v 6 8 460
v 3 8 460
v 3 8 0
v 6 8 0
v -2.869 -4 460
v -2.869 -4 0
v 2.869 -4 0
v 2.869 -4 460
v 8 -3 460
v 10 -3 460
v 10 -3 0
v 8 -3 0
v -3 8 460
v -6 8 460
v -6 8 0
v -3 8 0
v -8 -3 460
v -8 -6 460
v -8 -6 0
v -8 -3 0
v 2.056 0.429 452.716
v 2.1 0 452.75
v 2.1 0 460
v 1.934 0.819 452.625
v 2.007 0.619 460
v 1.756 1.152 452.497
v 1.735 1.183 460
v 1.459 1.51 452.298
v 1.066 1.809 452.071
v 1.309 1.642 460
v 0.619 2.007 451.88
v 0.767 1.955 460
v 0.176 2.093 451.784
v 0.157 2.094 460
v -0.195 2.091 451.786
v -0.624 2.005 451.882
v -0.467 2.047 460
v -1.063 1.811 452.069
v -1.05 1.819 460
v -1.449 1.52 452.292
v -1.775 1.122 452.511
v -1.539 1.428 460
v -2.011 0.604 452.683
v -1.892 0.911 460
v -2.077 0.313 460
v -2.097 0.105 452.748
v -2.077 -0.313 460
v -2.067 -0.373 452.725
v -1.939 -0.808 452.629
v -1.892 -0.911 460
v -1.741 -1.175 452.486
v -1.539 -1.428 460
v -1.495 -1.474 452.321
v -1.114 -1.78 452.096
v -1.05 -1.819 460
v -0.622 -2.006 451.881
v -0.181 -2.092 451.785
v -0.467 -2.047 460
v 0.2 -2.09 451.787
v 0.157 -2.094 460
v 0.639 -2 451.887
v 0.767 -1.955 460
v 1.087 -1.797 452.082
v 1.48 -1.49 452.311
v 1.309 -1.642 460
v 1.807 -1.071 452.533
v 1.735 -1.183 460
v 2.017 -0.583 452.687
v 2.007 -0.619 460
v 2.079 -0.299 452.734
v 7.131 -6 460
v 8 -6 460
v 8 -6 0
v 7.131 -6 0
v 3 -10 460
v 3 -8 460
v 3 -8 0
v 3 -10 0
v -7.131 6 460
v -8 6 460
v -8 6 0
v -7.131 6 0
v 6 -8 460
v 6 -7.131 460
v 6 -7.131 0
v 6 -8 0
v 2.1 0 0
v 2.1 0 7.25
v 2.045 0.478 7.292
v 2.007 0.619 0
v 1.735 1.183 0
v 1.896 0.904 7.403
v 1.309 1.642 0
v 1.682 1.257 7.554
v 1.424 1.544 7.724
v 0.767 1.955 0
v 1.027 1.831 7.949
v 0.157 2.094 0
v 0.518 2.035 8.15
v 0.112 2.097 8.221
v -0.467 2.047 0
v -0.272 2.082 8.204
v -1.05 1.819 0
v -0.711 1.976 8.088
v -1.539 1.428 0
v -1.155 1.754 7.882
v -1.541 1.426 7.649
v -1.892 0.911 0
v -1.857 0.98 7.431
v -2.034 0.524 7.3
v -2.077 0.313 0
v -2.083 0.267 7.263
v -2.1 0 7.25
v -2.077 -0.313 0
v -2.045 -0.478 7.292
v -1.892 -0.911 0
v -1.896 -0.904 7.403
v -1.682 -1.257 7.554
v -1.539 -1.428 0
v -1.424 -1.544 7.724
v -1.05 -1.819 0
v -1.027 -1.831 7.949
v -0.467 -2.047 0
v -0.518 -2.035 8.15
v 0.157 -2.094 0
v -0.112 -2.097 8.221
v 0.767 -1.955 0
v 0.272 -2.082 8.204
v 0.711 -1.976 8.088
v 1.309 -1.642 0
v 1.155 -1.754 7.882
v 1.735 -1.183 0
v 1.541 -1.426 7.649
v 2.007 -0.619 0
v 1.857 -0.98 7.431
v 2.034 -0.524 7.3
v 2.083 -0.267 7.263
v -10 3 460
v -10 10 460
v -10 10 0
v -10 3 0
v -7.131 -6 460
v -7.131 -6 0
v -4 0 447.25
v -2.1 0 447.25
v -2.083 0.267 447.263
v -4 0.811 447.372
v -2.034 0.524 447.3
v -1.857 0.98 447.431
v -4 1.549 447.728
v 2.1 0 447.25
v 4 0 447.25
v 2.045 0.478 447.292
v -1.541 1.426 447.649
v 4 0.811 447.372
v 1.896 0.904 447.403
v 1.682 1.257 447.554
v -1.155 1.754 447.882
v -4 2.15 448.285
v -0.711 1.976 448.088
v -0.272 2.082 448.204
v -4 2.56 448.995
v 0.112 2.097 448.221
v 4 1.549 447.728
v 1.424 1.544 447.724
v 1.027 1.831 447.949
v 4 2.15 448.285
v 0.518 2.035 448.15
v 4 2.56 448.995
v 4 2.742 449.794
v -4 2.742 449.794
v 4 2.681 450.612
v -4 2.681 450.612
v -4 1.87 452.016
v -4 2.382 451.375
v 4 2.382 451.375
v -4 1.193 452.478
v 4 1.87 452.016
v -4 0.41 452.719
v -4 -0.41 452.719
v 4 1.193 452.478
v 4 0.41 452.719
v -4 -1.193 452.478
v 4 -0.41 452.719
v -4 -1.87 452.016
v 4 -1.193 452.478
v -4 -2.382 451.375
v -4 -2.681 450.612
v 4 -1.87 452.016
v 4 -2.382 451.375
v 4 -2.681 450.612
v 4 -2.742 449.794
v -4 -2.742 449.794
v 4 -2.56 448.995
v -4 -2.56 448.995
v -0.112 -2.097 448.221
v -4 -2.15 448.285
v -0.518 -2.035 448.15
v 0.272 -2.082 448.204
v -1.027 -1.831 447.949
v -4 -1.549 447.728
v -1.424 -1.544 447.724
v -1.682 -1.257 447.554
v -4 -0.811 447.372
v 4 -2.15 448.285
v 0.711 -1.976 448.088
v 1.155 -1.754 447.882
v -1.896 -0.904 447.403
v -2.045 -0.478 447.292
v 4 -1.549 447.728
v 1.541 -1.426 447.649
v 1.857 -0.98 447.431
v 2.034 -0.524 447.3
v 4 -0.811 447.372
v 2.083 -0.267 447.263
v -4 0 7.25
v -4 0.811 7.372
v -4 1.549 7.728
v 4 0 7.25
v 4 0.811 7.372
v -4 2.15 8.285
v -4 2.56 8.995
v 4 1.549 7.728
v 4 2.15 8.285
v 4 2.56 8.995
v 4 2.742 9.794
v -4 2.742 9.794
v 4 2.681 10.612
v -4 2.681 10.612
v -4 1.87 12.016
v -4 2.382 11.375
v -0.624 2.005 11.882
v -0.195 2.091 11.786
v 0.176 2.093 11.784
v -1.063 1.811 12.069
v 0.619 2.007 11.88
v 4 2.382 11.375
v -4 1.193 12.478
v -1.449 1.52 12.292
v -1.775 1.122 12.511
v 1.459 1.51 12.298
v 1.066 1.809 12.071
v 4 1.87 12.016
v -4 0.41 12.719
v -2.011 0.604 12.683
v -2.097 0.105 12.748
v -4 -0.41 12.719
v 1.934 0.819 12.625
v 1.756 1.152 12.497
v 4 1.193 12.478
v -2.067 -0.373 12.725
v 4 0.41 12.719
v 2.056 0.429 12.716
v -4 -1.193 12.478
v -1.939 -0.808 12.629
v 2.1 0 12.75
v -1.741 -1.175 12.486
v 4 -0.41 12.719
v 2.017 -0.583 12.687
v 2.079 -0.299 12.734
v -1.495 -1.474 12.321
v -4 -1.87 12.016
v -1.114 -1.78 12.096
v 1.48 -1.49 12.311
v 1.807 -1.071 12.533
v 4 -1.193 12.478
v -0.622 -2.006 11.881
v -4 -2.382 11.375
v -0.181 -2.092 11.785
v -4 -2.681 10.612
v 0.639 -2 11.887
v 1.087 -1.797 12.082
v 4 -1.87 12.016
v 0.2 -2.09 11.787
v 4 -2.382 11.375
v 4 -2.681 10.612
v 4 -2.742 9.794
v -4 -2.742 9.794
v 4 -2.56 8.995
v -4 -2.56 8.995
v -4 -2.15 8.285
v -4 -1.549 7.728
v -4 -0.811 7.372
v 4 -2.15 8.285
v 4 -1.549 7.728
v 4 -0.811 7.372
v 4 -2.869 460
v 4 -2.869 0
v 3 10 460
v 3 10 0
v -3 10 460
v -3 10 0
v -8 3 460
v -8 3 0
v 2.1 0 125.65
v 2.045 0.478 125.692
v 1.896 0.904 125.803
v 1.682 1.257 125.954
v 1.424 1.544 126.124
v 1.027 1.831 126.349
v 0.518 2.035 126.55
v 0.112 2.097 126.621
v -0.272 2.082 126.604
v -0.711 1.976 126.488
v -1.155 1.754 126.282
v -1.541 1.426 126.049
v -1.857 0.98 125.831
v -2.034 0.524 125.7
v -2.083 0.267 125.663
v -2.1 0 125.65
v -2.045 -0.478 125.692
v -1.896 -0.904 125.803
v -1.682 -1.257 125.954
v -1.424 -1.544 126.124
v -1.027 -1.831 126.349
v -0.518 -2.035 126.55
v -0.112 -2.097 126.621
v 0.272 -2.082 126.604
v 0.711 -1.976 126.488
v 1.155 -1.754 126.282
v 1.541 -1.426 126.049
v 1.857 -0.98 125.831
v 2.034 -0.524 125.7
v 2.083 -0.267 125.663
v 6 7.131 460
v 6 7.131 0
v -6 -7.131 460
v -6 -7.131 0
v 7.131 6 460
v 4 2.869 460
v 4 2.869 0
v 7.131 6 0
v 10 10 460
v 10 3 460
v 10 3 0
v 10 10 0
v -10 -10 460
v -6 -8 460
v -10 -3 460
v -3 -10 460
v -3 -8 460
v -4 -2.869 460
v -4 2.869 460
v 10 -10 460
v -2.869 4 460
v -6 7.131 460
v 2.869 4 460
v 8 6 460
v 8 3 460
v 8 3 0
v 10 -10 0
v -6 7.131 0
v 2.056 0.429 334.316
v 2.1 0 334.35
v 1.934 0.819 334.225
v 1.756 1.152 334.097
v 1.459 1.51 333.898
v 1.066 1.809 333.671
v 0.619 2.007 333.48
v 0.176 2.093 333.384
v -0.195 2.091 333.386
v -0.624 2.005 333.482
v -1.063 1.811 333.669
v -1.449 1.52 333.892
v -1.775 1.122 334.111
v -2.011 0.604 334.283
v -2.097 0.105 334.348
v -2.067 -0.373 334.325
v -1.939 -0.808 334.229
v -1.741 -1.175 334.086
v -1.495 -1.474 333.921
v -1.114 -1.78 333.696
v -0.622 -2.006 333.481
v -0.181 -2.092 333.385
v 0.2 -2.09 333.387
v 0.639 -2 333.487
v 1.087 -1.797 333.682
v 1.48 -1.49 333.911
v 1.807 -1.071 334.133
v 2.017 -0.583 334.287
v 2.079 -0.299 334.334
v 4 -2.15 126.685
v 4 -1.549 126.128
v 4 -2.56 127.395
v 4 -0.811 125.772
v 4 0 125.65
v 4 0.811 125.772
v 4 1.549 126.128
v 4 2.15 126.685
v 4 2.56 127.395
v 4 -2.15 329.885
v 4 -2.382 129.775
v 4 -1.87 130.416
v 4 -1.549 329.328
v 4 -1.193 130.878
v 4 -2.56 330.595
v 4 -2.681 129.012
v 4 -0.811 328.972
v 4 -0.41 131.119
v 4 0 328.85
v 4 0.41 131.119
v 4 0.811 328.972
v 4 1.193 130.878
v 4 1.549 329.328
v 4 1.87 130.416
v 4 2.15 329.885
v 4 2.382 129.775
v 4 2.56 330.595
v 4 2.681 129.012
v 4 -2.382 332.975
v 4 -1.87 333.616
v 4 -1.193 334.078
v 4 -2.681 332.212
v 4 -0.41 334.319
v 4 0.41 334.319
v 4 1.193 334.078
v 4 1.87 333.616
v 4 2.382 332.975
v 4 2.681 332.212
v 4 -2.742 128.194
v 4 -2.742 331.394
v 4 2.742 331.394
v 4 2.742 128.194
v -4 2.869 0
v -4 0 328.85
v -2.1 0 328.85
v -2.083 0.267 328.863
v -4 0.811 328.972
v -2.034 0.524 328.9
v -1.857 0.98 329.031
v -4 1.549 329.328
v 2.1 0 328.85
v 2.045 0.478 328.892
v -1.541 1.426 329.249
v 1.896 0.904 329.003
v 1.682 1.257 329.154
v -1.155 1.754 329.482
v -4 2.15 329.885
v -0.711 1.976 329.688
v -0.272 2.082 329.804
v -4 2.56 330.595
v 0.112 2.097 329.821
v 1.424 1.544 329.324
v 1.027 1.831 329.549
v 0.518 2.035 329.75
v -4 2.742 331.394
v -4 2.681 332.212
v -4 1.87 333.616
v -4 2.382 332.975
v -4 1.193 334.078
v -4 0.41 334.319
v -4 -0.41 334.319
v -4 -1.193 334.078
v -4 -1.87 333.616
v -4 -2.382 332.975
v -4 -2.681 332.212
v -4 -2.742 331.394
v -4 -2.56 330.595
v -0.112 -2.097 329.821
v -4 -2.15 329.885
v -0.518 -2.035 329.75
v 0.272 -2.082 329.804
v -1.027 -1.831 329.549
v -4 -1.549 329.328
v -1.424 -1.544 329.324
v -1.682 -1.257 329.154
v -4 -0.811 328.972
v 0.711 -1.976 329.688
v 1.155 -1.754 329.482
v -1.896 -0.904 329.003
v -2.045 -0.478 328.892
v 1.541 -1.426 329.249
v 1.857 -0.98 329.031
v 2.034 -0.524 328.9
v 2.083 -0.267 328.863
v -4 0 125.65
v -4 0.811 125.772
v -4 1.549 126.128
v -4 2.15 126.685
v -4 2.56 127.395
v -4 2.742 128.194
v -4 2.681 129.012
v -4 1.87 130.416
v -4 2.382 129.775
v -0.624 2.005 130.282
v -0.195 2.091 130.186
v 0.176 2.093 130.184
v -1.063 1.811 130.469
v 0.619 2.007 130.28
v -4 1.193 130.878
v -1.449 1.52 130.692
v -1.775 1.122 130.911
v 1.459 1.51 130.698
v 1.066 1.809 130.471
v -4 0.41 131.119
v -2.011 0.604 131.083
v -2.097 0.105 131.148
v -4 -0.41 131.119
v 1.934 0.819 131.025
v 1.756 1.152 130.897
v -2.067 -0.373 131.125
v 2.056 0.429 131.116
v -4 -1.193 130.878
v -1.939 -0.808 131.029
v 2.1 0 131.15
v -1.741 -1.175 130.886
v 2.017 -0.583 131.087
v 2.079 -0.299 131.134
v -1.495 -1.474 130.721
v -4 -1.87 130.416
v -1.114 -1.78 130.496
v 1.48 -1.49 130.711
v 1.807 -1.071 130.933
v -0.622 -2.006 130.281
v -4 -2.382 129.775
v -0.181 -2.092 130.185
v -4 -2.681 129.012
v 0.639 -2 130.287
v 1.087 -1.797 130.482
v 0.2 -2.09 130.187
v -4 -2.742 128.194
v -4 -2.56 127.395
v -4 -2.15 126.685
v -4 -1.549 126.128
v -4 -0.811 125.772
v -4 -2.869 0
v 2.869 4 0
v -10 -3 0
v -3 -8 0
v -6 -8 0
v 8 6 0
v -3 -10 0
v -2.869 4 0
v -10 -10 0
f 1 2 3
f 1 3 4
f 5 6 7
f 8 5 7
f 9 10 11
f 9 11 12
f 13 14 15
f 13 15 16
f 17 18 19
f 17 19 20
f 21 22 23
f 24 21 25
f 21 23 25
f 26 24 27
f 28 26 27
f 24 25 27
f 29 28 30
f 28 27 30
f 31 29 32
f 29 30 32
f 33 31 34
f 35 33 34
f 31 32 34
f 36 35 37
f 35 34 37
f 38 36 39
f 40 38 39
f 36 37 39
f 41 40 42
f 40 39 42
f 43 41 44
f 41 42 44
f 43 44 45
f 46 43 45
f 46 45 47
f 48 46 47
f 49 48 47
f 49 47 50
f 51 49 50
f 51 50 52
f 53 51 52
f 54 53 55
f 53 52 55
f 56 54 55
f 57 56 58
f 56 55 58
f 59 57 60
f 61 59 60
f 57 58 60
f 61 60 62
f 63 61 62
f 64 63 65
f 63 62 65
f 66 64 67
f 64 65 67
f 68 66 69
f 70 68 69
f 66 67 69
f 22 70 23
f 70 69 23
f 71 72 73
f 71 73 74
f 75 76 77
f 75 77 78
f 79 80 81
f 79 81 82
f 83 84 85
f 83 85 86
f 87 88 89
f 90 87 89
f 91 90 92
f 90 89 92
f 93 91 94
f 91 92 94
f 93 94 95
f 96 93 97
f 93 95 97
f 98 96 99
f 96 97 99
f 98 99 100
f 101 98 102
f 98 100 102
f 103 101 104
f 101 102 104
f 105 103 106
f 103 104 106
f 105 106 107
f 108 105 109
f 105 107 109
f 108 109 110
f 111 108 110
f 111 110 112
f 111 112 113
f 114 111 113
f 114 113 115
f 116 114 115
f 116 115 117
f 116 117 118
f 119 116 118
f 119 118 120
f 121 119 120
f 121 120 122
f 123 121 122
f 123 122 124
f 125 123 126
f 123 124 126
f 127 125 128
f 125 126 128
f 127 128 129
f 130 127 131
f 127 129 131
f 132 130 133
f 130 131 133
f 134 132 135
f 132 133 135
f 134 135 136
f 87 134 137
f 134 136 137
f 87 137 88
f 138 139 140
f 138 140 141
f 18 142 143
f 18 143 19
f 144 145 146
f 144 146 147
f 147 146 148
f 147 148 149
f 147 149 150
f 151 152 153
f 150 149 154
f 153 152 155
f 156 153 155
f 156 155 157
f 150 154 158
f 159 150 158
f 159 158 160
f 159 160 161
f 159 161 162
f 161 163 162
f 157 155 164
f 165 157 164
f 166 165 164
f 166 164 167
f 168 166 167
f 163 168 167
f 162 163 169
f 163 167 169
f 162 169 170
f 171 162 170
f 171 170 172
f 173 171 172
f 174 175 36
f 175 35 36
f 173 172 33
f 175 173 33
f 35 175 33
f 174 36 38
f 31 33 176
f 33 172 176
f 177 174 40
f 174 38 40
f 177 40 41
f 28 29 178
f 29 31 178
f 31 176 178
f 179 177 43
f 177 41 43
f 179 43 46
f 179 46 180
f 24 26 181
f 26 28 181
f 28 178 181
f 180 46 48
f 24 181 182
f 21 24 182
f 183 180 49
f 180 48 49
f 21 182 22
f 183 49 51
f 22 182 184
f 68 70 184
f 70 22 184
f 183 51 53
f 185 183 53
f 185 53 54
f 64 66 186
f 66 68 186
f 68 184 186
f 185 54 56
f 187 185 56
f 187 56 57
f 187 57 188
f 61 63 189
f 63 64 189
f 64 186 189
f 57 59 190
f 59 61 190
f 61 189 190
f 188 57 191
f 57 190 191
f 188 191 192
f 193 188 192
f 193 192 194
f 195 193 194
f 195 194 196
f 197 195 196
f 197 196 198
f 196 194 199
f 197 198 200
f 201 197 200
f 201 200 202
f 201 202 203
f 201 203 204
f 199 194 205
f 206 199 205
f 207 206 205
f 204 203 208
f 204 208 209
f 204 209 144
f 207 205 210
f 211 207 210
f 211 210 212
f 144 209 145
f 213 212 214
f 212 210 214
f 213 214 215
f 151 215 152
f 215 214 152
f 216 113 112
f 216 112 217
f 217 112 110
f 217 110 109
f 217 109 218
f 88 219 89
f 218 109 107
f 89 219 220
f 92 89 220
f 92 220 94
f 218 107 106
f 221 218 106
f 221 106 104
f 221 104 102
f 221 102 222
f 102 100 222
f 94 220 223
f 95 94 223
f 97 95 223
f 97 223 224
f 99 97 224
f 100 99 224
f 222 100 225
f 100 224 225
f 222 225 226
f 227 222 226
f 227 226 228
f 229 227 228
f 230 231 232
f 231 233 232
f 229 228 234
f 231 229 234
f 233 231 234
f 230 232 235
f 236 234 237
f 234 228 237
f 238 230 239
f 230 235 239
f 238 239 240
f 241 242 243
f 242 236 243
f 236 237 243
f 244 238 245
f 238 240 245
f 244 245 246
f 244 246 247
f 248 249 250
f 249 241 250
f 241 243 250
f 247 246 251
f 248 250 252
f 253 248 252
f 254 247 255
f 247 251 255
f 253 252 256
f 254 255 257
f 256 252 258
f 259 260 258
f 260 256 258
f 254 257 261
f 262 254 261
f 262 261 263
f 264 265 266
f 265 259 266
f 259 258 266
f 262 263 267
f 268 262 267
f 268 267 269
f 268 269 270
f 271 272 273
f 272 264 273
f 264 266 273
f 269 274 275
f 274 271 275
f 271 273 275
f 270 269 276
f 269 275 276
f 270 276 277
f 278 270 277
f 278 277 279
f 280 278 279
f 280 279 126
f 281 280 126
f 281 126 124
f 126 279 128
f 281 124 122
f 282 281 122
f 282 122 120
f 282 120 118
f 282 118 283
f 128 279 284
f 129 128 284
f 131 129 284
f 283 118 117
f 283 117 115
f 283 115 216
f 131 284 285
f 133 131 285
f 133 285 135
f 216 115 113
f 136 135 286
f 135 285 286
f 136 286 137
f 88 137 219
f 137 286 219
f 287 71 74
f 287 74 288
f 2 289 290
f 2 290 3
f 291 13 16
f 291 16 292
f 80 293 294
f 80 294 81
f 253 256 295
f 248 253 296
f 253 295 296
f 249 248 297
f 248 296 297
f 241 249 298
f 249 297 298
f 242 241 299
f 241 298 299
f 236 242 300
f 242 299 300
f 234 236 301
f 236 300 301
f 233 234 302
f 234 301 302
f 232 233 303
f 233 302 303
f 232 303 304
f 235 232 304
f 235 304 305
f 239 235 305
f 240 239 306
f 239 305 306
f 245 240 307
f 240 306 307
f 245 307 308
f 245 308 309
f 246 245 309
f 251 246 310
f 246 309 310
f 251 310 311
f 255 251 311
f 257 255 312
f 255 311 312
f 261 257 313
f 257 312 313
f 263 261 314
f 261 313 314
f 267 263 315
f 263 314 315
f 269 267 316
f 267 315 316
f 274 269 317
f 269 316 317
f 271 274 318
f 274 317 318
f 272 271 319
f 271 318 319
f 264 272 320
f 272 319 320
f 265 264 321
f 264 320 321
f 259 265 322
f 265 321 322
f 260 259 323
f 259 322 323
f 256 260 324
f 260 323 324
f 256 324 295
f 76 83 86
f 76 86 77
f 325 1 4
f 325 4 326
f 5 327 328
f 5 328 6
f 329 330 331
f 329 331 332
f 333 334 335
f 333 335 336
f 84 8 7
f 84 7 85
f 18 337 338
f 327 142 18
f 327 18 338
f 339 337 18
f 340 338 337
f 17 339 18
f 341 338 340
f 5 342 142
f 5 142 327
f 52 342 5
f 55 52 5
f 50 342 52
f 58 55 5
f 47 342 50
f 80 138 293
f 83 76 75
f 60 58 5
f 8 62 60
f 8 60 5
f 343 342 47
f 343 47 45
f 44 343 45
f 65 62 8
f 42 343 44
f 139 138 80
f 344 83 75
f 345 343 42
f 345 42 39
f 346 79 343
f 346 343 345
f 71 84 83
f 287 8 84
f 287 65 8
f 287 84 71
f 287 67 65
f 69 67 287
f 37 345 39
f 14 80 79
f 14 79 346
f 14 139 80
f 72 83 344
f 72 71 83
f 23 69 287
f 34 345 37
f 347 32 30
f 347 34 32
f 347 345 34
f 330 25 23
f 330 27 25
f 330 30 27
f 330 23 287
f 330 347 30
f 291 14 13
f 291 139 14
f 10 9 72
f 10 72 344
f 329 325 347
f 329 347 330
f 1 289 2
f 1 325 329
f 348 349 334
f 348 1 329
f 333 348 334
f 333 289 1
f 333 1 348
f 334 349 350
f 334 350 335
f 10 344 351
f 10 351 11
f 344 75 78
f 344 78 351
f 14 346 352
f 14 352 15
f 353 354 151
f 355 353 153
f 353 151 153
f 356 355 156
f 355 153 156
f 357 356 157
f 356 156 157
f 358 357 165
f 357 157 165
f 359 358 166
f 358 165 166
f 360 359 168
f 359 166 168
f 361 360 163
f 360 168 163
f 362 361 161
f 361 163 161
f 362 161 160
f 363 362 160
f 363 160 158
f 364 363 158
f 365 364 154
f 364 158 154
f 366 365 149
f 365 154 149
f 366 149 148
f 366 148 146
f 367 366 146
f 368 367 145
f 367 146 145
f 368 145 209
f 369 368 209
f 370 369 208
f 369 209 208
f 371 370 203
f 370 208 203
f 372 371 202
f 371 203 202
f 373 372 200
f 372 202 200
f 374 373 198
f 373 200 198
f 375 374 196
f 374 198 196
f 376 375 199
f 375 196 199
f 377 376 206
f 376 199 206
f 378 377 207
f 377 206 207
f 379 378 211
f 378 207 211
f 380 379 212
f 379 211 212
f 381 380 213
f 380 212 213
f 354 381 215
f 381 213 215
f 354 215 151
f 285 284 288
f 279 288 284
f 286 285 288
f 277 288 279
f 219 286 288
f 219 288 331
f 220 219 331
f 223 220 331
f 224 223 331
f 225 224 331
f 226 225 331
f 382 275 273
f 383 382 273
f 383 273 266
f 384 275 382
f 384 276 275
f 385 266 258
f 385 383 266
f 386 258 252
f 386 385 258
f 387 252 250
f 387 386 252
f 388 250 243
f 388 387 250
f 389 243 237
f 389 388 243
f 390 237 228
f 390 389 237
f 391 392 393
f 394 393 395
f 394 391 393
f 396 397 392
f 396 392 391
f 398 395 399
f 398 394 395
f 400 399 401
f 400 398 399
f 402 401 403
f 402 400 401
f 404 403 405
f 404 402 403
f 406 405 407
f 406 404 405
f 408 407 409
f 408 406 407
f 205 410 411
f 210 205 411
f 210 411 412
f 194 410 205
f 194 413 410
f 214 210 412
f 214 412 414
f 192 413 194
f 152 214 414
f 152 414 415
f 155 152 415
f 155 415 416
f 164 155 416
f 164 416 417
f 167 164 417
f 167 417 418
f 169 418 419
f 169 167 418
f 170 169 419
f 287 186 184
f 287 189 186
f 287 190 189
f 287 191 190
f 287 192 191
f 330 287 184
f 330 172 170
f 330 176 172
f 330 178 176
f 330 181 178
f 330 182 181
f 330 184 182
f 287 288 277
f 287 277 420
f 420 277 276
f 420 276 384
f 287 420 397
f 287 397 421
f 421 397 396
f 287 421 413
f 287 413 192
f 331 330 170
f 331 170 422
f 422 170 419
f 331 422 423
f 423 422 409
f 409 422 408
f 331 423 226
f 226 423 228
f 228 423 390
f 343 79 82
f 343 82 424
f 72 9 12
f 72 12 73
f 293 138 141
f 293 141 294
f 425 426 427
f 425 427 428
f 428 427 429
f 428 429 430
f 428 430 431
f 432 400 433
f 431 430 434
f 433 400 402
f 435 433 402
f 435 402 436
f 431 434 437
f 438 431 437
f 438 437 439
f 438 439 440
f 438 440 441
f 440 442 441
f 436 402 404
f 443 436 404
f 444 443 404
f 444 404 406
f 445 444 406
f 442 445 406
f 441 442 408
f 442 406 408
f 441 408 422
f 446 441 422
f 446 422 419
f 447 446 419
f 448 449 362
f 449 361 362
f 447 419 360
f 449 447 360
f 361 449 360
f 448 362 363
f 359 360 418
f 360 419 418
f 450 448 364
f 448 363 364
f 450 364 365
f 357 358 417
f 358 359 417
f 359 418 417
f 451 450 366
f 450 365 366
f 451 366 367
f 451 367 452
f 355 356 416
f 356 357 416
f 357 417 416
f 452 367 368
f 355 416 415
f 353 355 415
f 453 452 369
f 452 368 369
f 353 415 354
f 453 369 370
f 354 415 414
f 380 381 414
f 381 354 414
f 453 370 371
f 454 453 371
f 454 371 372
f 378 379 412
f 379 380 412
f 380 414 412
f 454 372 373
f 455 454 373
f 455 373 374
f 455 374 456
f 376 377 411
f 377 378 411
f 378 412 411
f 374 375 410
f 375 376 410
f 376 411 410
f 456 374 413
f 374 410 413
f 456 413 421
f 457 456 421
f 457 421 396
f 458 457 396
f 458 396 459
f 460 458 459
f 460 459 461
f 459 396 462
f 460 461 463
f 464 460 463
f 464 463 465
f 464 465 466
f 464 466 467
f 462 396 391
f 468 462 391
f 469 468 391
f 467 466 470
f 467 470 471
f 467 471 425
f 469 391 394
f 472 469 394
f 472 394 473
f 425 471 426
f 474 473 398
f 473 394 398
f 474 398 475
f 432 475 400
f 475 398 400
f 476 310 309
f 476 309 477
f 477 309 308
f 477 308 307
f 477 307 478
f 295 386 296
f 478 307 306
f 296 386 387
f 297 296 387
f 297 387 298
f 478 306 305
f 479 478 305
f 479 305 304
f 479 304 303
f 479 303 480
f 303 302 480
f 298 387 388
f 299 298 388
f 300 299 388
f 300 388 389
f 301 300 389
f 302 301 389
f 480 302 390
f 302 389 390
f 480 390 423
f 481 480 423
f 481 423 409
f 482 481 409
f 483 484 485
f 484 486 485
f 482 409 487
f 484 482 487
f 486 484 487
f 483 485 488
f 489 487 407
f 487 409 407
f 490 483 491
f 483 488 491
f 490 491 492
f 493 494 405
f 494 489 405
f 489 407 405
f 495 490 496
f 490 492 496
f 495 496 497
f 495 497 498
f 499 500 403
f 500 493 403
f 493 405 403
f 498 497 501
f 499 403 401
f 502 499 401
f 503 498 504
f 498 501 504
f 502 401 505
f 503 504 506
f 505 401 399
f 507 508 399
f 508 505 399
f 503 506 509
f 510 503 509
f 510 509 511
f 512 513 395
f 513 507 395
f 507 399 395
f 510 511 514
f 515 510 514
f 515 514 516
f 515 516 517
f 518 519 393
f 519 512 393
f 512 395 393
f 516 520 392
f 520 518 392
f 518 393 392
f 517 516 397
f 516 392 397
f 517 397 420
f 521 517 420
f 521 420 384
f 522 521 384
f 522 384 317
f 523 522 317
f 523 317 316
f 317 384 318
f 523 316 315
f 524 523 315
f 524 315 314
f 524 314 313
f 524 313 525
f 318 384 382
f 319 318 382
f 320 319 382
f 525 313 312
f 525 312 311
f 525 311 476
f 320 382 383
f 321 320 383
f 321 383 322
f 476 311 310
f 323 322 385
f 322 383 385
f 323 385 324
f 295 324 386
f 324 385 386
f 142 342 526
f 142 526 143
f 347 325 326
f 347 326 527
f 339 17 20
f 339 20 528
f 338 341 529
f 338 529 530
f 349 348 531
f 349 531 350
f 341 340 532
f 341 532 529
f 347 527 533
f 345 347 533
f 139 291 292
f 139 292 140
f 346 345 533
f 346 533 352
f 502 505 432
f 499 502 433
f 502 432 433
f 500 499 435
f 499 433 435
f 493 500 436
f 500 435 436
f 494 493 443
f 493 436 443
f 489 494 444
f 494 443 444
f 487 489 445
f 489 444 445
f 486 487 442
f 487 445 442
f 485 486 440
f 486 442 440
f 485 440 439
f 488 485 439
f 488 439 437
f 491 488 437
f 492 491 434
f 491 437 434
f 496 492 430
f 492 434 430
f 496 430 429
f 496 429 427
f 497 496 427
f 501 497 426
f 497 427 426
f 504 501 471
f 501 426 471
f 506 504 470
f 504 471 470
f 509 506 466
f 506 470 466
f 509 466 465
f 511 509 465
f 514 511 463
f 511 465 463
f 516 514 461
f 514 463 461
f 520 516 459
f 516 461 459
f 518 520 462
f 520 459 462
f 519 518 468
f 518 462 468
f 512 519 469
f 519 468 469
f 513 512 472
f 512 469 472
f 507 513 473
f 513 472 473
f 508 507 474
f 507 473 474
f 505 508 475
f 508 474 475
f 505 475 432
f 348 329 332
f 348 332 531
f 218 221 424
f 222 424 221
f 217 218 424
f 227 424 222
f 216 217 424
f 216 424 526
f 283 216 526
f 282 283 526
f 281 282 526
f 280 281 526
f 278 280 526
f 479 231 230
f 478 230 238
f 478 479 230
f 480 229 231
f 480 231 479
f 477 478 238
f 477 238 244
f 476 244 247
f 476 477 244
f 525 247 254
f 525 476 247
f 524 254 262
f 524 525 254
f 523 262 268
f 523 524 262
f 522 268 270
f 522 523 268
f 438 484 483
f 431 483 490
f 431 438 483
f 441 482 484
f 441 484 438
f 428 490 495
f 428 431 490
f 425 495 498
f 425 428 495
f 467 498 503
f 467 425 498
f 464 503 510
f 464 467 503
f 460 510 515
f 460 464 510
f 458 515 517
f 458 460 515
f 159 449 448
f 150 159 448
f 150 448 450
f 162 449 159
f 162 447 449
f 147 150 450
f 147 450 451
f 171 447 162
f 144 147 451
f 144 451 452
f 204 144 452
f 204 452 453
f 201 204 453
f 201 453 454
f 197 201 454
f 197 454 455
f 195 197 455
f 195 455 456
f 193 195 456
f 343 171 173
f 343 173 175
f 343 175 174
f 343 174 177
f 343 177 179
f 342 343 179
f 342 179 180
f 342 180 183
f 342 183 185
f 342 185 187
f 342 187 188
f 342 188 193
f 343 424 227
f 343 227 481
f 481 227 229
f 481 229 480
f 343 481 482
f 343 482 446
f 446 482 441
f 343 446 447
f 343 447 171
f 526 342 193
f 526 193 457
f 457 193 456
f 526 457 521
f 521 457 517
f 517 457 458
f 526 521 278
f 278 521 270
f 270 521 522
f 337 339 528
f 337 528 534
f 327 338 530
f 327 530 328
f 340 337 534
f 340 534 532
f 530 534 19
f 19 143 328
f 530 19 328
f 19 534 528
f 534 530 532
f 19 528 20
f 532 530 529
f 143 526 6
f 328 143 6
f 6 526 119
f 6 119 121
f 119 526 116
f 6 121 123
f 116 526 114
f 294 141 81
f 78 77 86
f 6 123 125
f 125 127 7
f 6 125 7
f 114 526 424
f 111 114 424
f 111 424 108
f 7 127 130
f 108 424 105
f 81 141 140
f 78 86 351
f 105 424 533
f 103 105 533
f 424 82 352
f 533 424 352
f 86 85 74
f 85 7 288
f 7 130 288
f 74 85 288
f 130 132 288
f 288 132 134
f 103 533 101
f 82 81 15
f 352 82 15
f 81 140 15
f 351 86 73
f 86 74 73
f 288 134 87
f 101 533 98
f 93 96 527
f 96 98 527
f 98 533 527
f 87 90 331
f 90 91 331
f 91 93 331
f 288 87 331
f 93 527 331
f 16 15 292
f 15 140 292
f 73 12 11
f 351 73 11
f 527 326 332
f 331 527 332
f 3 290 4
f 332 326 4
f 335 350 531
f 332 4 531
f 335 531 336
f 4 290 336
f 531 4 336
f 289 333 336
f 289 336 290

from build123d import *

# Parameters (mm, degrees)
CROQUIS1_R              = 2.1
SALIENTE_EXTRUIR1_DEPTH = 460
CROQUIS2_R              = 2.75
CORTAR_EXTRUIR1_DEPTH   = 21


with BuildPart() as part:
    # Croquis1 → Saliente-Extruir1 (new body)
    with BuildSketch(Plane.XY.offset(460)):
        Polygon((-10, 10), (-10, 3), (-8, 3), (-8, 6), (-7.13137085, 6), (-4, 2.86862915), (-4, -2.86862915), (-7.13137085, -6), (-8, -6), (-8, -3), (-10, -3), (-10, -10), (-3, -10), (-3, -8), (-6, -8), (-6, -7.13137085), (-2.86862915, -4), (2.86862915, -4), (6, -7.13137085), (6, -8), (3, -8), (3, -10), (10, -10), (10, -3), (8, -3), (8, -6), (7.13137085, -6), (4, -2.86862915), (4, 2.86862915), (7.13137085, 6), (8, 6), (8, 3), (10, 3), (10, 10), (3, 10), (3, 8), (6, 8), (6, 7.13137085), (2.86862915, 4), (-2.86862915, 4), (-6, 7.13137085), (-6, 8), (-3, 8), (-3, 10), align=None)
        Circle(CROQUIS1_R, mode=Mode.SUBTRACT)
    extrude(amount=-SALIENTE_EXTRUIR1_DEPTH)

    # Croquis2 → Cortar-Extruir1 (cut, through all)
    with BuildSketch(Plane(origin=(10, 0, 0), x_dir=(0, 0, -1), z_dir=(1, 0, 0))):
        with Locations((-128.4, 0)):
            Circle(CROQUIS2_R)
        with Locations((-331.6, 0)):
            Circle(CROQUIS2_R)
        with Locations((-450, 0)):
            Circle(CROQUIS2_R)
        with Locations((-10, 0)):
            Circle(CROQUIS2_R)
    extrude(amount=-CORTAR_EXTRUIR1_DEPTH, mode=Mode.SUBTRACT)


solid = part.part
